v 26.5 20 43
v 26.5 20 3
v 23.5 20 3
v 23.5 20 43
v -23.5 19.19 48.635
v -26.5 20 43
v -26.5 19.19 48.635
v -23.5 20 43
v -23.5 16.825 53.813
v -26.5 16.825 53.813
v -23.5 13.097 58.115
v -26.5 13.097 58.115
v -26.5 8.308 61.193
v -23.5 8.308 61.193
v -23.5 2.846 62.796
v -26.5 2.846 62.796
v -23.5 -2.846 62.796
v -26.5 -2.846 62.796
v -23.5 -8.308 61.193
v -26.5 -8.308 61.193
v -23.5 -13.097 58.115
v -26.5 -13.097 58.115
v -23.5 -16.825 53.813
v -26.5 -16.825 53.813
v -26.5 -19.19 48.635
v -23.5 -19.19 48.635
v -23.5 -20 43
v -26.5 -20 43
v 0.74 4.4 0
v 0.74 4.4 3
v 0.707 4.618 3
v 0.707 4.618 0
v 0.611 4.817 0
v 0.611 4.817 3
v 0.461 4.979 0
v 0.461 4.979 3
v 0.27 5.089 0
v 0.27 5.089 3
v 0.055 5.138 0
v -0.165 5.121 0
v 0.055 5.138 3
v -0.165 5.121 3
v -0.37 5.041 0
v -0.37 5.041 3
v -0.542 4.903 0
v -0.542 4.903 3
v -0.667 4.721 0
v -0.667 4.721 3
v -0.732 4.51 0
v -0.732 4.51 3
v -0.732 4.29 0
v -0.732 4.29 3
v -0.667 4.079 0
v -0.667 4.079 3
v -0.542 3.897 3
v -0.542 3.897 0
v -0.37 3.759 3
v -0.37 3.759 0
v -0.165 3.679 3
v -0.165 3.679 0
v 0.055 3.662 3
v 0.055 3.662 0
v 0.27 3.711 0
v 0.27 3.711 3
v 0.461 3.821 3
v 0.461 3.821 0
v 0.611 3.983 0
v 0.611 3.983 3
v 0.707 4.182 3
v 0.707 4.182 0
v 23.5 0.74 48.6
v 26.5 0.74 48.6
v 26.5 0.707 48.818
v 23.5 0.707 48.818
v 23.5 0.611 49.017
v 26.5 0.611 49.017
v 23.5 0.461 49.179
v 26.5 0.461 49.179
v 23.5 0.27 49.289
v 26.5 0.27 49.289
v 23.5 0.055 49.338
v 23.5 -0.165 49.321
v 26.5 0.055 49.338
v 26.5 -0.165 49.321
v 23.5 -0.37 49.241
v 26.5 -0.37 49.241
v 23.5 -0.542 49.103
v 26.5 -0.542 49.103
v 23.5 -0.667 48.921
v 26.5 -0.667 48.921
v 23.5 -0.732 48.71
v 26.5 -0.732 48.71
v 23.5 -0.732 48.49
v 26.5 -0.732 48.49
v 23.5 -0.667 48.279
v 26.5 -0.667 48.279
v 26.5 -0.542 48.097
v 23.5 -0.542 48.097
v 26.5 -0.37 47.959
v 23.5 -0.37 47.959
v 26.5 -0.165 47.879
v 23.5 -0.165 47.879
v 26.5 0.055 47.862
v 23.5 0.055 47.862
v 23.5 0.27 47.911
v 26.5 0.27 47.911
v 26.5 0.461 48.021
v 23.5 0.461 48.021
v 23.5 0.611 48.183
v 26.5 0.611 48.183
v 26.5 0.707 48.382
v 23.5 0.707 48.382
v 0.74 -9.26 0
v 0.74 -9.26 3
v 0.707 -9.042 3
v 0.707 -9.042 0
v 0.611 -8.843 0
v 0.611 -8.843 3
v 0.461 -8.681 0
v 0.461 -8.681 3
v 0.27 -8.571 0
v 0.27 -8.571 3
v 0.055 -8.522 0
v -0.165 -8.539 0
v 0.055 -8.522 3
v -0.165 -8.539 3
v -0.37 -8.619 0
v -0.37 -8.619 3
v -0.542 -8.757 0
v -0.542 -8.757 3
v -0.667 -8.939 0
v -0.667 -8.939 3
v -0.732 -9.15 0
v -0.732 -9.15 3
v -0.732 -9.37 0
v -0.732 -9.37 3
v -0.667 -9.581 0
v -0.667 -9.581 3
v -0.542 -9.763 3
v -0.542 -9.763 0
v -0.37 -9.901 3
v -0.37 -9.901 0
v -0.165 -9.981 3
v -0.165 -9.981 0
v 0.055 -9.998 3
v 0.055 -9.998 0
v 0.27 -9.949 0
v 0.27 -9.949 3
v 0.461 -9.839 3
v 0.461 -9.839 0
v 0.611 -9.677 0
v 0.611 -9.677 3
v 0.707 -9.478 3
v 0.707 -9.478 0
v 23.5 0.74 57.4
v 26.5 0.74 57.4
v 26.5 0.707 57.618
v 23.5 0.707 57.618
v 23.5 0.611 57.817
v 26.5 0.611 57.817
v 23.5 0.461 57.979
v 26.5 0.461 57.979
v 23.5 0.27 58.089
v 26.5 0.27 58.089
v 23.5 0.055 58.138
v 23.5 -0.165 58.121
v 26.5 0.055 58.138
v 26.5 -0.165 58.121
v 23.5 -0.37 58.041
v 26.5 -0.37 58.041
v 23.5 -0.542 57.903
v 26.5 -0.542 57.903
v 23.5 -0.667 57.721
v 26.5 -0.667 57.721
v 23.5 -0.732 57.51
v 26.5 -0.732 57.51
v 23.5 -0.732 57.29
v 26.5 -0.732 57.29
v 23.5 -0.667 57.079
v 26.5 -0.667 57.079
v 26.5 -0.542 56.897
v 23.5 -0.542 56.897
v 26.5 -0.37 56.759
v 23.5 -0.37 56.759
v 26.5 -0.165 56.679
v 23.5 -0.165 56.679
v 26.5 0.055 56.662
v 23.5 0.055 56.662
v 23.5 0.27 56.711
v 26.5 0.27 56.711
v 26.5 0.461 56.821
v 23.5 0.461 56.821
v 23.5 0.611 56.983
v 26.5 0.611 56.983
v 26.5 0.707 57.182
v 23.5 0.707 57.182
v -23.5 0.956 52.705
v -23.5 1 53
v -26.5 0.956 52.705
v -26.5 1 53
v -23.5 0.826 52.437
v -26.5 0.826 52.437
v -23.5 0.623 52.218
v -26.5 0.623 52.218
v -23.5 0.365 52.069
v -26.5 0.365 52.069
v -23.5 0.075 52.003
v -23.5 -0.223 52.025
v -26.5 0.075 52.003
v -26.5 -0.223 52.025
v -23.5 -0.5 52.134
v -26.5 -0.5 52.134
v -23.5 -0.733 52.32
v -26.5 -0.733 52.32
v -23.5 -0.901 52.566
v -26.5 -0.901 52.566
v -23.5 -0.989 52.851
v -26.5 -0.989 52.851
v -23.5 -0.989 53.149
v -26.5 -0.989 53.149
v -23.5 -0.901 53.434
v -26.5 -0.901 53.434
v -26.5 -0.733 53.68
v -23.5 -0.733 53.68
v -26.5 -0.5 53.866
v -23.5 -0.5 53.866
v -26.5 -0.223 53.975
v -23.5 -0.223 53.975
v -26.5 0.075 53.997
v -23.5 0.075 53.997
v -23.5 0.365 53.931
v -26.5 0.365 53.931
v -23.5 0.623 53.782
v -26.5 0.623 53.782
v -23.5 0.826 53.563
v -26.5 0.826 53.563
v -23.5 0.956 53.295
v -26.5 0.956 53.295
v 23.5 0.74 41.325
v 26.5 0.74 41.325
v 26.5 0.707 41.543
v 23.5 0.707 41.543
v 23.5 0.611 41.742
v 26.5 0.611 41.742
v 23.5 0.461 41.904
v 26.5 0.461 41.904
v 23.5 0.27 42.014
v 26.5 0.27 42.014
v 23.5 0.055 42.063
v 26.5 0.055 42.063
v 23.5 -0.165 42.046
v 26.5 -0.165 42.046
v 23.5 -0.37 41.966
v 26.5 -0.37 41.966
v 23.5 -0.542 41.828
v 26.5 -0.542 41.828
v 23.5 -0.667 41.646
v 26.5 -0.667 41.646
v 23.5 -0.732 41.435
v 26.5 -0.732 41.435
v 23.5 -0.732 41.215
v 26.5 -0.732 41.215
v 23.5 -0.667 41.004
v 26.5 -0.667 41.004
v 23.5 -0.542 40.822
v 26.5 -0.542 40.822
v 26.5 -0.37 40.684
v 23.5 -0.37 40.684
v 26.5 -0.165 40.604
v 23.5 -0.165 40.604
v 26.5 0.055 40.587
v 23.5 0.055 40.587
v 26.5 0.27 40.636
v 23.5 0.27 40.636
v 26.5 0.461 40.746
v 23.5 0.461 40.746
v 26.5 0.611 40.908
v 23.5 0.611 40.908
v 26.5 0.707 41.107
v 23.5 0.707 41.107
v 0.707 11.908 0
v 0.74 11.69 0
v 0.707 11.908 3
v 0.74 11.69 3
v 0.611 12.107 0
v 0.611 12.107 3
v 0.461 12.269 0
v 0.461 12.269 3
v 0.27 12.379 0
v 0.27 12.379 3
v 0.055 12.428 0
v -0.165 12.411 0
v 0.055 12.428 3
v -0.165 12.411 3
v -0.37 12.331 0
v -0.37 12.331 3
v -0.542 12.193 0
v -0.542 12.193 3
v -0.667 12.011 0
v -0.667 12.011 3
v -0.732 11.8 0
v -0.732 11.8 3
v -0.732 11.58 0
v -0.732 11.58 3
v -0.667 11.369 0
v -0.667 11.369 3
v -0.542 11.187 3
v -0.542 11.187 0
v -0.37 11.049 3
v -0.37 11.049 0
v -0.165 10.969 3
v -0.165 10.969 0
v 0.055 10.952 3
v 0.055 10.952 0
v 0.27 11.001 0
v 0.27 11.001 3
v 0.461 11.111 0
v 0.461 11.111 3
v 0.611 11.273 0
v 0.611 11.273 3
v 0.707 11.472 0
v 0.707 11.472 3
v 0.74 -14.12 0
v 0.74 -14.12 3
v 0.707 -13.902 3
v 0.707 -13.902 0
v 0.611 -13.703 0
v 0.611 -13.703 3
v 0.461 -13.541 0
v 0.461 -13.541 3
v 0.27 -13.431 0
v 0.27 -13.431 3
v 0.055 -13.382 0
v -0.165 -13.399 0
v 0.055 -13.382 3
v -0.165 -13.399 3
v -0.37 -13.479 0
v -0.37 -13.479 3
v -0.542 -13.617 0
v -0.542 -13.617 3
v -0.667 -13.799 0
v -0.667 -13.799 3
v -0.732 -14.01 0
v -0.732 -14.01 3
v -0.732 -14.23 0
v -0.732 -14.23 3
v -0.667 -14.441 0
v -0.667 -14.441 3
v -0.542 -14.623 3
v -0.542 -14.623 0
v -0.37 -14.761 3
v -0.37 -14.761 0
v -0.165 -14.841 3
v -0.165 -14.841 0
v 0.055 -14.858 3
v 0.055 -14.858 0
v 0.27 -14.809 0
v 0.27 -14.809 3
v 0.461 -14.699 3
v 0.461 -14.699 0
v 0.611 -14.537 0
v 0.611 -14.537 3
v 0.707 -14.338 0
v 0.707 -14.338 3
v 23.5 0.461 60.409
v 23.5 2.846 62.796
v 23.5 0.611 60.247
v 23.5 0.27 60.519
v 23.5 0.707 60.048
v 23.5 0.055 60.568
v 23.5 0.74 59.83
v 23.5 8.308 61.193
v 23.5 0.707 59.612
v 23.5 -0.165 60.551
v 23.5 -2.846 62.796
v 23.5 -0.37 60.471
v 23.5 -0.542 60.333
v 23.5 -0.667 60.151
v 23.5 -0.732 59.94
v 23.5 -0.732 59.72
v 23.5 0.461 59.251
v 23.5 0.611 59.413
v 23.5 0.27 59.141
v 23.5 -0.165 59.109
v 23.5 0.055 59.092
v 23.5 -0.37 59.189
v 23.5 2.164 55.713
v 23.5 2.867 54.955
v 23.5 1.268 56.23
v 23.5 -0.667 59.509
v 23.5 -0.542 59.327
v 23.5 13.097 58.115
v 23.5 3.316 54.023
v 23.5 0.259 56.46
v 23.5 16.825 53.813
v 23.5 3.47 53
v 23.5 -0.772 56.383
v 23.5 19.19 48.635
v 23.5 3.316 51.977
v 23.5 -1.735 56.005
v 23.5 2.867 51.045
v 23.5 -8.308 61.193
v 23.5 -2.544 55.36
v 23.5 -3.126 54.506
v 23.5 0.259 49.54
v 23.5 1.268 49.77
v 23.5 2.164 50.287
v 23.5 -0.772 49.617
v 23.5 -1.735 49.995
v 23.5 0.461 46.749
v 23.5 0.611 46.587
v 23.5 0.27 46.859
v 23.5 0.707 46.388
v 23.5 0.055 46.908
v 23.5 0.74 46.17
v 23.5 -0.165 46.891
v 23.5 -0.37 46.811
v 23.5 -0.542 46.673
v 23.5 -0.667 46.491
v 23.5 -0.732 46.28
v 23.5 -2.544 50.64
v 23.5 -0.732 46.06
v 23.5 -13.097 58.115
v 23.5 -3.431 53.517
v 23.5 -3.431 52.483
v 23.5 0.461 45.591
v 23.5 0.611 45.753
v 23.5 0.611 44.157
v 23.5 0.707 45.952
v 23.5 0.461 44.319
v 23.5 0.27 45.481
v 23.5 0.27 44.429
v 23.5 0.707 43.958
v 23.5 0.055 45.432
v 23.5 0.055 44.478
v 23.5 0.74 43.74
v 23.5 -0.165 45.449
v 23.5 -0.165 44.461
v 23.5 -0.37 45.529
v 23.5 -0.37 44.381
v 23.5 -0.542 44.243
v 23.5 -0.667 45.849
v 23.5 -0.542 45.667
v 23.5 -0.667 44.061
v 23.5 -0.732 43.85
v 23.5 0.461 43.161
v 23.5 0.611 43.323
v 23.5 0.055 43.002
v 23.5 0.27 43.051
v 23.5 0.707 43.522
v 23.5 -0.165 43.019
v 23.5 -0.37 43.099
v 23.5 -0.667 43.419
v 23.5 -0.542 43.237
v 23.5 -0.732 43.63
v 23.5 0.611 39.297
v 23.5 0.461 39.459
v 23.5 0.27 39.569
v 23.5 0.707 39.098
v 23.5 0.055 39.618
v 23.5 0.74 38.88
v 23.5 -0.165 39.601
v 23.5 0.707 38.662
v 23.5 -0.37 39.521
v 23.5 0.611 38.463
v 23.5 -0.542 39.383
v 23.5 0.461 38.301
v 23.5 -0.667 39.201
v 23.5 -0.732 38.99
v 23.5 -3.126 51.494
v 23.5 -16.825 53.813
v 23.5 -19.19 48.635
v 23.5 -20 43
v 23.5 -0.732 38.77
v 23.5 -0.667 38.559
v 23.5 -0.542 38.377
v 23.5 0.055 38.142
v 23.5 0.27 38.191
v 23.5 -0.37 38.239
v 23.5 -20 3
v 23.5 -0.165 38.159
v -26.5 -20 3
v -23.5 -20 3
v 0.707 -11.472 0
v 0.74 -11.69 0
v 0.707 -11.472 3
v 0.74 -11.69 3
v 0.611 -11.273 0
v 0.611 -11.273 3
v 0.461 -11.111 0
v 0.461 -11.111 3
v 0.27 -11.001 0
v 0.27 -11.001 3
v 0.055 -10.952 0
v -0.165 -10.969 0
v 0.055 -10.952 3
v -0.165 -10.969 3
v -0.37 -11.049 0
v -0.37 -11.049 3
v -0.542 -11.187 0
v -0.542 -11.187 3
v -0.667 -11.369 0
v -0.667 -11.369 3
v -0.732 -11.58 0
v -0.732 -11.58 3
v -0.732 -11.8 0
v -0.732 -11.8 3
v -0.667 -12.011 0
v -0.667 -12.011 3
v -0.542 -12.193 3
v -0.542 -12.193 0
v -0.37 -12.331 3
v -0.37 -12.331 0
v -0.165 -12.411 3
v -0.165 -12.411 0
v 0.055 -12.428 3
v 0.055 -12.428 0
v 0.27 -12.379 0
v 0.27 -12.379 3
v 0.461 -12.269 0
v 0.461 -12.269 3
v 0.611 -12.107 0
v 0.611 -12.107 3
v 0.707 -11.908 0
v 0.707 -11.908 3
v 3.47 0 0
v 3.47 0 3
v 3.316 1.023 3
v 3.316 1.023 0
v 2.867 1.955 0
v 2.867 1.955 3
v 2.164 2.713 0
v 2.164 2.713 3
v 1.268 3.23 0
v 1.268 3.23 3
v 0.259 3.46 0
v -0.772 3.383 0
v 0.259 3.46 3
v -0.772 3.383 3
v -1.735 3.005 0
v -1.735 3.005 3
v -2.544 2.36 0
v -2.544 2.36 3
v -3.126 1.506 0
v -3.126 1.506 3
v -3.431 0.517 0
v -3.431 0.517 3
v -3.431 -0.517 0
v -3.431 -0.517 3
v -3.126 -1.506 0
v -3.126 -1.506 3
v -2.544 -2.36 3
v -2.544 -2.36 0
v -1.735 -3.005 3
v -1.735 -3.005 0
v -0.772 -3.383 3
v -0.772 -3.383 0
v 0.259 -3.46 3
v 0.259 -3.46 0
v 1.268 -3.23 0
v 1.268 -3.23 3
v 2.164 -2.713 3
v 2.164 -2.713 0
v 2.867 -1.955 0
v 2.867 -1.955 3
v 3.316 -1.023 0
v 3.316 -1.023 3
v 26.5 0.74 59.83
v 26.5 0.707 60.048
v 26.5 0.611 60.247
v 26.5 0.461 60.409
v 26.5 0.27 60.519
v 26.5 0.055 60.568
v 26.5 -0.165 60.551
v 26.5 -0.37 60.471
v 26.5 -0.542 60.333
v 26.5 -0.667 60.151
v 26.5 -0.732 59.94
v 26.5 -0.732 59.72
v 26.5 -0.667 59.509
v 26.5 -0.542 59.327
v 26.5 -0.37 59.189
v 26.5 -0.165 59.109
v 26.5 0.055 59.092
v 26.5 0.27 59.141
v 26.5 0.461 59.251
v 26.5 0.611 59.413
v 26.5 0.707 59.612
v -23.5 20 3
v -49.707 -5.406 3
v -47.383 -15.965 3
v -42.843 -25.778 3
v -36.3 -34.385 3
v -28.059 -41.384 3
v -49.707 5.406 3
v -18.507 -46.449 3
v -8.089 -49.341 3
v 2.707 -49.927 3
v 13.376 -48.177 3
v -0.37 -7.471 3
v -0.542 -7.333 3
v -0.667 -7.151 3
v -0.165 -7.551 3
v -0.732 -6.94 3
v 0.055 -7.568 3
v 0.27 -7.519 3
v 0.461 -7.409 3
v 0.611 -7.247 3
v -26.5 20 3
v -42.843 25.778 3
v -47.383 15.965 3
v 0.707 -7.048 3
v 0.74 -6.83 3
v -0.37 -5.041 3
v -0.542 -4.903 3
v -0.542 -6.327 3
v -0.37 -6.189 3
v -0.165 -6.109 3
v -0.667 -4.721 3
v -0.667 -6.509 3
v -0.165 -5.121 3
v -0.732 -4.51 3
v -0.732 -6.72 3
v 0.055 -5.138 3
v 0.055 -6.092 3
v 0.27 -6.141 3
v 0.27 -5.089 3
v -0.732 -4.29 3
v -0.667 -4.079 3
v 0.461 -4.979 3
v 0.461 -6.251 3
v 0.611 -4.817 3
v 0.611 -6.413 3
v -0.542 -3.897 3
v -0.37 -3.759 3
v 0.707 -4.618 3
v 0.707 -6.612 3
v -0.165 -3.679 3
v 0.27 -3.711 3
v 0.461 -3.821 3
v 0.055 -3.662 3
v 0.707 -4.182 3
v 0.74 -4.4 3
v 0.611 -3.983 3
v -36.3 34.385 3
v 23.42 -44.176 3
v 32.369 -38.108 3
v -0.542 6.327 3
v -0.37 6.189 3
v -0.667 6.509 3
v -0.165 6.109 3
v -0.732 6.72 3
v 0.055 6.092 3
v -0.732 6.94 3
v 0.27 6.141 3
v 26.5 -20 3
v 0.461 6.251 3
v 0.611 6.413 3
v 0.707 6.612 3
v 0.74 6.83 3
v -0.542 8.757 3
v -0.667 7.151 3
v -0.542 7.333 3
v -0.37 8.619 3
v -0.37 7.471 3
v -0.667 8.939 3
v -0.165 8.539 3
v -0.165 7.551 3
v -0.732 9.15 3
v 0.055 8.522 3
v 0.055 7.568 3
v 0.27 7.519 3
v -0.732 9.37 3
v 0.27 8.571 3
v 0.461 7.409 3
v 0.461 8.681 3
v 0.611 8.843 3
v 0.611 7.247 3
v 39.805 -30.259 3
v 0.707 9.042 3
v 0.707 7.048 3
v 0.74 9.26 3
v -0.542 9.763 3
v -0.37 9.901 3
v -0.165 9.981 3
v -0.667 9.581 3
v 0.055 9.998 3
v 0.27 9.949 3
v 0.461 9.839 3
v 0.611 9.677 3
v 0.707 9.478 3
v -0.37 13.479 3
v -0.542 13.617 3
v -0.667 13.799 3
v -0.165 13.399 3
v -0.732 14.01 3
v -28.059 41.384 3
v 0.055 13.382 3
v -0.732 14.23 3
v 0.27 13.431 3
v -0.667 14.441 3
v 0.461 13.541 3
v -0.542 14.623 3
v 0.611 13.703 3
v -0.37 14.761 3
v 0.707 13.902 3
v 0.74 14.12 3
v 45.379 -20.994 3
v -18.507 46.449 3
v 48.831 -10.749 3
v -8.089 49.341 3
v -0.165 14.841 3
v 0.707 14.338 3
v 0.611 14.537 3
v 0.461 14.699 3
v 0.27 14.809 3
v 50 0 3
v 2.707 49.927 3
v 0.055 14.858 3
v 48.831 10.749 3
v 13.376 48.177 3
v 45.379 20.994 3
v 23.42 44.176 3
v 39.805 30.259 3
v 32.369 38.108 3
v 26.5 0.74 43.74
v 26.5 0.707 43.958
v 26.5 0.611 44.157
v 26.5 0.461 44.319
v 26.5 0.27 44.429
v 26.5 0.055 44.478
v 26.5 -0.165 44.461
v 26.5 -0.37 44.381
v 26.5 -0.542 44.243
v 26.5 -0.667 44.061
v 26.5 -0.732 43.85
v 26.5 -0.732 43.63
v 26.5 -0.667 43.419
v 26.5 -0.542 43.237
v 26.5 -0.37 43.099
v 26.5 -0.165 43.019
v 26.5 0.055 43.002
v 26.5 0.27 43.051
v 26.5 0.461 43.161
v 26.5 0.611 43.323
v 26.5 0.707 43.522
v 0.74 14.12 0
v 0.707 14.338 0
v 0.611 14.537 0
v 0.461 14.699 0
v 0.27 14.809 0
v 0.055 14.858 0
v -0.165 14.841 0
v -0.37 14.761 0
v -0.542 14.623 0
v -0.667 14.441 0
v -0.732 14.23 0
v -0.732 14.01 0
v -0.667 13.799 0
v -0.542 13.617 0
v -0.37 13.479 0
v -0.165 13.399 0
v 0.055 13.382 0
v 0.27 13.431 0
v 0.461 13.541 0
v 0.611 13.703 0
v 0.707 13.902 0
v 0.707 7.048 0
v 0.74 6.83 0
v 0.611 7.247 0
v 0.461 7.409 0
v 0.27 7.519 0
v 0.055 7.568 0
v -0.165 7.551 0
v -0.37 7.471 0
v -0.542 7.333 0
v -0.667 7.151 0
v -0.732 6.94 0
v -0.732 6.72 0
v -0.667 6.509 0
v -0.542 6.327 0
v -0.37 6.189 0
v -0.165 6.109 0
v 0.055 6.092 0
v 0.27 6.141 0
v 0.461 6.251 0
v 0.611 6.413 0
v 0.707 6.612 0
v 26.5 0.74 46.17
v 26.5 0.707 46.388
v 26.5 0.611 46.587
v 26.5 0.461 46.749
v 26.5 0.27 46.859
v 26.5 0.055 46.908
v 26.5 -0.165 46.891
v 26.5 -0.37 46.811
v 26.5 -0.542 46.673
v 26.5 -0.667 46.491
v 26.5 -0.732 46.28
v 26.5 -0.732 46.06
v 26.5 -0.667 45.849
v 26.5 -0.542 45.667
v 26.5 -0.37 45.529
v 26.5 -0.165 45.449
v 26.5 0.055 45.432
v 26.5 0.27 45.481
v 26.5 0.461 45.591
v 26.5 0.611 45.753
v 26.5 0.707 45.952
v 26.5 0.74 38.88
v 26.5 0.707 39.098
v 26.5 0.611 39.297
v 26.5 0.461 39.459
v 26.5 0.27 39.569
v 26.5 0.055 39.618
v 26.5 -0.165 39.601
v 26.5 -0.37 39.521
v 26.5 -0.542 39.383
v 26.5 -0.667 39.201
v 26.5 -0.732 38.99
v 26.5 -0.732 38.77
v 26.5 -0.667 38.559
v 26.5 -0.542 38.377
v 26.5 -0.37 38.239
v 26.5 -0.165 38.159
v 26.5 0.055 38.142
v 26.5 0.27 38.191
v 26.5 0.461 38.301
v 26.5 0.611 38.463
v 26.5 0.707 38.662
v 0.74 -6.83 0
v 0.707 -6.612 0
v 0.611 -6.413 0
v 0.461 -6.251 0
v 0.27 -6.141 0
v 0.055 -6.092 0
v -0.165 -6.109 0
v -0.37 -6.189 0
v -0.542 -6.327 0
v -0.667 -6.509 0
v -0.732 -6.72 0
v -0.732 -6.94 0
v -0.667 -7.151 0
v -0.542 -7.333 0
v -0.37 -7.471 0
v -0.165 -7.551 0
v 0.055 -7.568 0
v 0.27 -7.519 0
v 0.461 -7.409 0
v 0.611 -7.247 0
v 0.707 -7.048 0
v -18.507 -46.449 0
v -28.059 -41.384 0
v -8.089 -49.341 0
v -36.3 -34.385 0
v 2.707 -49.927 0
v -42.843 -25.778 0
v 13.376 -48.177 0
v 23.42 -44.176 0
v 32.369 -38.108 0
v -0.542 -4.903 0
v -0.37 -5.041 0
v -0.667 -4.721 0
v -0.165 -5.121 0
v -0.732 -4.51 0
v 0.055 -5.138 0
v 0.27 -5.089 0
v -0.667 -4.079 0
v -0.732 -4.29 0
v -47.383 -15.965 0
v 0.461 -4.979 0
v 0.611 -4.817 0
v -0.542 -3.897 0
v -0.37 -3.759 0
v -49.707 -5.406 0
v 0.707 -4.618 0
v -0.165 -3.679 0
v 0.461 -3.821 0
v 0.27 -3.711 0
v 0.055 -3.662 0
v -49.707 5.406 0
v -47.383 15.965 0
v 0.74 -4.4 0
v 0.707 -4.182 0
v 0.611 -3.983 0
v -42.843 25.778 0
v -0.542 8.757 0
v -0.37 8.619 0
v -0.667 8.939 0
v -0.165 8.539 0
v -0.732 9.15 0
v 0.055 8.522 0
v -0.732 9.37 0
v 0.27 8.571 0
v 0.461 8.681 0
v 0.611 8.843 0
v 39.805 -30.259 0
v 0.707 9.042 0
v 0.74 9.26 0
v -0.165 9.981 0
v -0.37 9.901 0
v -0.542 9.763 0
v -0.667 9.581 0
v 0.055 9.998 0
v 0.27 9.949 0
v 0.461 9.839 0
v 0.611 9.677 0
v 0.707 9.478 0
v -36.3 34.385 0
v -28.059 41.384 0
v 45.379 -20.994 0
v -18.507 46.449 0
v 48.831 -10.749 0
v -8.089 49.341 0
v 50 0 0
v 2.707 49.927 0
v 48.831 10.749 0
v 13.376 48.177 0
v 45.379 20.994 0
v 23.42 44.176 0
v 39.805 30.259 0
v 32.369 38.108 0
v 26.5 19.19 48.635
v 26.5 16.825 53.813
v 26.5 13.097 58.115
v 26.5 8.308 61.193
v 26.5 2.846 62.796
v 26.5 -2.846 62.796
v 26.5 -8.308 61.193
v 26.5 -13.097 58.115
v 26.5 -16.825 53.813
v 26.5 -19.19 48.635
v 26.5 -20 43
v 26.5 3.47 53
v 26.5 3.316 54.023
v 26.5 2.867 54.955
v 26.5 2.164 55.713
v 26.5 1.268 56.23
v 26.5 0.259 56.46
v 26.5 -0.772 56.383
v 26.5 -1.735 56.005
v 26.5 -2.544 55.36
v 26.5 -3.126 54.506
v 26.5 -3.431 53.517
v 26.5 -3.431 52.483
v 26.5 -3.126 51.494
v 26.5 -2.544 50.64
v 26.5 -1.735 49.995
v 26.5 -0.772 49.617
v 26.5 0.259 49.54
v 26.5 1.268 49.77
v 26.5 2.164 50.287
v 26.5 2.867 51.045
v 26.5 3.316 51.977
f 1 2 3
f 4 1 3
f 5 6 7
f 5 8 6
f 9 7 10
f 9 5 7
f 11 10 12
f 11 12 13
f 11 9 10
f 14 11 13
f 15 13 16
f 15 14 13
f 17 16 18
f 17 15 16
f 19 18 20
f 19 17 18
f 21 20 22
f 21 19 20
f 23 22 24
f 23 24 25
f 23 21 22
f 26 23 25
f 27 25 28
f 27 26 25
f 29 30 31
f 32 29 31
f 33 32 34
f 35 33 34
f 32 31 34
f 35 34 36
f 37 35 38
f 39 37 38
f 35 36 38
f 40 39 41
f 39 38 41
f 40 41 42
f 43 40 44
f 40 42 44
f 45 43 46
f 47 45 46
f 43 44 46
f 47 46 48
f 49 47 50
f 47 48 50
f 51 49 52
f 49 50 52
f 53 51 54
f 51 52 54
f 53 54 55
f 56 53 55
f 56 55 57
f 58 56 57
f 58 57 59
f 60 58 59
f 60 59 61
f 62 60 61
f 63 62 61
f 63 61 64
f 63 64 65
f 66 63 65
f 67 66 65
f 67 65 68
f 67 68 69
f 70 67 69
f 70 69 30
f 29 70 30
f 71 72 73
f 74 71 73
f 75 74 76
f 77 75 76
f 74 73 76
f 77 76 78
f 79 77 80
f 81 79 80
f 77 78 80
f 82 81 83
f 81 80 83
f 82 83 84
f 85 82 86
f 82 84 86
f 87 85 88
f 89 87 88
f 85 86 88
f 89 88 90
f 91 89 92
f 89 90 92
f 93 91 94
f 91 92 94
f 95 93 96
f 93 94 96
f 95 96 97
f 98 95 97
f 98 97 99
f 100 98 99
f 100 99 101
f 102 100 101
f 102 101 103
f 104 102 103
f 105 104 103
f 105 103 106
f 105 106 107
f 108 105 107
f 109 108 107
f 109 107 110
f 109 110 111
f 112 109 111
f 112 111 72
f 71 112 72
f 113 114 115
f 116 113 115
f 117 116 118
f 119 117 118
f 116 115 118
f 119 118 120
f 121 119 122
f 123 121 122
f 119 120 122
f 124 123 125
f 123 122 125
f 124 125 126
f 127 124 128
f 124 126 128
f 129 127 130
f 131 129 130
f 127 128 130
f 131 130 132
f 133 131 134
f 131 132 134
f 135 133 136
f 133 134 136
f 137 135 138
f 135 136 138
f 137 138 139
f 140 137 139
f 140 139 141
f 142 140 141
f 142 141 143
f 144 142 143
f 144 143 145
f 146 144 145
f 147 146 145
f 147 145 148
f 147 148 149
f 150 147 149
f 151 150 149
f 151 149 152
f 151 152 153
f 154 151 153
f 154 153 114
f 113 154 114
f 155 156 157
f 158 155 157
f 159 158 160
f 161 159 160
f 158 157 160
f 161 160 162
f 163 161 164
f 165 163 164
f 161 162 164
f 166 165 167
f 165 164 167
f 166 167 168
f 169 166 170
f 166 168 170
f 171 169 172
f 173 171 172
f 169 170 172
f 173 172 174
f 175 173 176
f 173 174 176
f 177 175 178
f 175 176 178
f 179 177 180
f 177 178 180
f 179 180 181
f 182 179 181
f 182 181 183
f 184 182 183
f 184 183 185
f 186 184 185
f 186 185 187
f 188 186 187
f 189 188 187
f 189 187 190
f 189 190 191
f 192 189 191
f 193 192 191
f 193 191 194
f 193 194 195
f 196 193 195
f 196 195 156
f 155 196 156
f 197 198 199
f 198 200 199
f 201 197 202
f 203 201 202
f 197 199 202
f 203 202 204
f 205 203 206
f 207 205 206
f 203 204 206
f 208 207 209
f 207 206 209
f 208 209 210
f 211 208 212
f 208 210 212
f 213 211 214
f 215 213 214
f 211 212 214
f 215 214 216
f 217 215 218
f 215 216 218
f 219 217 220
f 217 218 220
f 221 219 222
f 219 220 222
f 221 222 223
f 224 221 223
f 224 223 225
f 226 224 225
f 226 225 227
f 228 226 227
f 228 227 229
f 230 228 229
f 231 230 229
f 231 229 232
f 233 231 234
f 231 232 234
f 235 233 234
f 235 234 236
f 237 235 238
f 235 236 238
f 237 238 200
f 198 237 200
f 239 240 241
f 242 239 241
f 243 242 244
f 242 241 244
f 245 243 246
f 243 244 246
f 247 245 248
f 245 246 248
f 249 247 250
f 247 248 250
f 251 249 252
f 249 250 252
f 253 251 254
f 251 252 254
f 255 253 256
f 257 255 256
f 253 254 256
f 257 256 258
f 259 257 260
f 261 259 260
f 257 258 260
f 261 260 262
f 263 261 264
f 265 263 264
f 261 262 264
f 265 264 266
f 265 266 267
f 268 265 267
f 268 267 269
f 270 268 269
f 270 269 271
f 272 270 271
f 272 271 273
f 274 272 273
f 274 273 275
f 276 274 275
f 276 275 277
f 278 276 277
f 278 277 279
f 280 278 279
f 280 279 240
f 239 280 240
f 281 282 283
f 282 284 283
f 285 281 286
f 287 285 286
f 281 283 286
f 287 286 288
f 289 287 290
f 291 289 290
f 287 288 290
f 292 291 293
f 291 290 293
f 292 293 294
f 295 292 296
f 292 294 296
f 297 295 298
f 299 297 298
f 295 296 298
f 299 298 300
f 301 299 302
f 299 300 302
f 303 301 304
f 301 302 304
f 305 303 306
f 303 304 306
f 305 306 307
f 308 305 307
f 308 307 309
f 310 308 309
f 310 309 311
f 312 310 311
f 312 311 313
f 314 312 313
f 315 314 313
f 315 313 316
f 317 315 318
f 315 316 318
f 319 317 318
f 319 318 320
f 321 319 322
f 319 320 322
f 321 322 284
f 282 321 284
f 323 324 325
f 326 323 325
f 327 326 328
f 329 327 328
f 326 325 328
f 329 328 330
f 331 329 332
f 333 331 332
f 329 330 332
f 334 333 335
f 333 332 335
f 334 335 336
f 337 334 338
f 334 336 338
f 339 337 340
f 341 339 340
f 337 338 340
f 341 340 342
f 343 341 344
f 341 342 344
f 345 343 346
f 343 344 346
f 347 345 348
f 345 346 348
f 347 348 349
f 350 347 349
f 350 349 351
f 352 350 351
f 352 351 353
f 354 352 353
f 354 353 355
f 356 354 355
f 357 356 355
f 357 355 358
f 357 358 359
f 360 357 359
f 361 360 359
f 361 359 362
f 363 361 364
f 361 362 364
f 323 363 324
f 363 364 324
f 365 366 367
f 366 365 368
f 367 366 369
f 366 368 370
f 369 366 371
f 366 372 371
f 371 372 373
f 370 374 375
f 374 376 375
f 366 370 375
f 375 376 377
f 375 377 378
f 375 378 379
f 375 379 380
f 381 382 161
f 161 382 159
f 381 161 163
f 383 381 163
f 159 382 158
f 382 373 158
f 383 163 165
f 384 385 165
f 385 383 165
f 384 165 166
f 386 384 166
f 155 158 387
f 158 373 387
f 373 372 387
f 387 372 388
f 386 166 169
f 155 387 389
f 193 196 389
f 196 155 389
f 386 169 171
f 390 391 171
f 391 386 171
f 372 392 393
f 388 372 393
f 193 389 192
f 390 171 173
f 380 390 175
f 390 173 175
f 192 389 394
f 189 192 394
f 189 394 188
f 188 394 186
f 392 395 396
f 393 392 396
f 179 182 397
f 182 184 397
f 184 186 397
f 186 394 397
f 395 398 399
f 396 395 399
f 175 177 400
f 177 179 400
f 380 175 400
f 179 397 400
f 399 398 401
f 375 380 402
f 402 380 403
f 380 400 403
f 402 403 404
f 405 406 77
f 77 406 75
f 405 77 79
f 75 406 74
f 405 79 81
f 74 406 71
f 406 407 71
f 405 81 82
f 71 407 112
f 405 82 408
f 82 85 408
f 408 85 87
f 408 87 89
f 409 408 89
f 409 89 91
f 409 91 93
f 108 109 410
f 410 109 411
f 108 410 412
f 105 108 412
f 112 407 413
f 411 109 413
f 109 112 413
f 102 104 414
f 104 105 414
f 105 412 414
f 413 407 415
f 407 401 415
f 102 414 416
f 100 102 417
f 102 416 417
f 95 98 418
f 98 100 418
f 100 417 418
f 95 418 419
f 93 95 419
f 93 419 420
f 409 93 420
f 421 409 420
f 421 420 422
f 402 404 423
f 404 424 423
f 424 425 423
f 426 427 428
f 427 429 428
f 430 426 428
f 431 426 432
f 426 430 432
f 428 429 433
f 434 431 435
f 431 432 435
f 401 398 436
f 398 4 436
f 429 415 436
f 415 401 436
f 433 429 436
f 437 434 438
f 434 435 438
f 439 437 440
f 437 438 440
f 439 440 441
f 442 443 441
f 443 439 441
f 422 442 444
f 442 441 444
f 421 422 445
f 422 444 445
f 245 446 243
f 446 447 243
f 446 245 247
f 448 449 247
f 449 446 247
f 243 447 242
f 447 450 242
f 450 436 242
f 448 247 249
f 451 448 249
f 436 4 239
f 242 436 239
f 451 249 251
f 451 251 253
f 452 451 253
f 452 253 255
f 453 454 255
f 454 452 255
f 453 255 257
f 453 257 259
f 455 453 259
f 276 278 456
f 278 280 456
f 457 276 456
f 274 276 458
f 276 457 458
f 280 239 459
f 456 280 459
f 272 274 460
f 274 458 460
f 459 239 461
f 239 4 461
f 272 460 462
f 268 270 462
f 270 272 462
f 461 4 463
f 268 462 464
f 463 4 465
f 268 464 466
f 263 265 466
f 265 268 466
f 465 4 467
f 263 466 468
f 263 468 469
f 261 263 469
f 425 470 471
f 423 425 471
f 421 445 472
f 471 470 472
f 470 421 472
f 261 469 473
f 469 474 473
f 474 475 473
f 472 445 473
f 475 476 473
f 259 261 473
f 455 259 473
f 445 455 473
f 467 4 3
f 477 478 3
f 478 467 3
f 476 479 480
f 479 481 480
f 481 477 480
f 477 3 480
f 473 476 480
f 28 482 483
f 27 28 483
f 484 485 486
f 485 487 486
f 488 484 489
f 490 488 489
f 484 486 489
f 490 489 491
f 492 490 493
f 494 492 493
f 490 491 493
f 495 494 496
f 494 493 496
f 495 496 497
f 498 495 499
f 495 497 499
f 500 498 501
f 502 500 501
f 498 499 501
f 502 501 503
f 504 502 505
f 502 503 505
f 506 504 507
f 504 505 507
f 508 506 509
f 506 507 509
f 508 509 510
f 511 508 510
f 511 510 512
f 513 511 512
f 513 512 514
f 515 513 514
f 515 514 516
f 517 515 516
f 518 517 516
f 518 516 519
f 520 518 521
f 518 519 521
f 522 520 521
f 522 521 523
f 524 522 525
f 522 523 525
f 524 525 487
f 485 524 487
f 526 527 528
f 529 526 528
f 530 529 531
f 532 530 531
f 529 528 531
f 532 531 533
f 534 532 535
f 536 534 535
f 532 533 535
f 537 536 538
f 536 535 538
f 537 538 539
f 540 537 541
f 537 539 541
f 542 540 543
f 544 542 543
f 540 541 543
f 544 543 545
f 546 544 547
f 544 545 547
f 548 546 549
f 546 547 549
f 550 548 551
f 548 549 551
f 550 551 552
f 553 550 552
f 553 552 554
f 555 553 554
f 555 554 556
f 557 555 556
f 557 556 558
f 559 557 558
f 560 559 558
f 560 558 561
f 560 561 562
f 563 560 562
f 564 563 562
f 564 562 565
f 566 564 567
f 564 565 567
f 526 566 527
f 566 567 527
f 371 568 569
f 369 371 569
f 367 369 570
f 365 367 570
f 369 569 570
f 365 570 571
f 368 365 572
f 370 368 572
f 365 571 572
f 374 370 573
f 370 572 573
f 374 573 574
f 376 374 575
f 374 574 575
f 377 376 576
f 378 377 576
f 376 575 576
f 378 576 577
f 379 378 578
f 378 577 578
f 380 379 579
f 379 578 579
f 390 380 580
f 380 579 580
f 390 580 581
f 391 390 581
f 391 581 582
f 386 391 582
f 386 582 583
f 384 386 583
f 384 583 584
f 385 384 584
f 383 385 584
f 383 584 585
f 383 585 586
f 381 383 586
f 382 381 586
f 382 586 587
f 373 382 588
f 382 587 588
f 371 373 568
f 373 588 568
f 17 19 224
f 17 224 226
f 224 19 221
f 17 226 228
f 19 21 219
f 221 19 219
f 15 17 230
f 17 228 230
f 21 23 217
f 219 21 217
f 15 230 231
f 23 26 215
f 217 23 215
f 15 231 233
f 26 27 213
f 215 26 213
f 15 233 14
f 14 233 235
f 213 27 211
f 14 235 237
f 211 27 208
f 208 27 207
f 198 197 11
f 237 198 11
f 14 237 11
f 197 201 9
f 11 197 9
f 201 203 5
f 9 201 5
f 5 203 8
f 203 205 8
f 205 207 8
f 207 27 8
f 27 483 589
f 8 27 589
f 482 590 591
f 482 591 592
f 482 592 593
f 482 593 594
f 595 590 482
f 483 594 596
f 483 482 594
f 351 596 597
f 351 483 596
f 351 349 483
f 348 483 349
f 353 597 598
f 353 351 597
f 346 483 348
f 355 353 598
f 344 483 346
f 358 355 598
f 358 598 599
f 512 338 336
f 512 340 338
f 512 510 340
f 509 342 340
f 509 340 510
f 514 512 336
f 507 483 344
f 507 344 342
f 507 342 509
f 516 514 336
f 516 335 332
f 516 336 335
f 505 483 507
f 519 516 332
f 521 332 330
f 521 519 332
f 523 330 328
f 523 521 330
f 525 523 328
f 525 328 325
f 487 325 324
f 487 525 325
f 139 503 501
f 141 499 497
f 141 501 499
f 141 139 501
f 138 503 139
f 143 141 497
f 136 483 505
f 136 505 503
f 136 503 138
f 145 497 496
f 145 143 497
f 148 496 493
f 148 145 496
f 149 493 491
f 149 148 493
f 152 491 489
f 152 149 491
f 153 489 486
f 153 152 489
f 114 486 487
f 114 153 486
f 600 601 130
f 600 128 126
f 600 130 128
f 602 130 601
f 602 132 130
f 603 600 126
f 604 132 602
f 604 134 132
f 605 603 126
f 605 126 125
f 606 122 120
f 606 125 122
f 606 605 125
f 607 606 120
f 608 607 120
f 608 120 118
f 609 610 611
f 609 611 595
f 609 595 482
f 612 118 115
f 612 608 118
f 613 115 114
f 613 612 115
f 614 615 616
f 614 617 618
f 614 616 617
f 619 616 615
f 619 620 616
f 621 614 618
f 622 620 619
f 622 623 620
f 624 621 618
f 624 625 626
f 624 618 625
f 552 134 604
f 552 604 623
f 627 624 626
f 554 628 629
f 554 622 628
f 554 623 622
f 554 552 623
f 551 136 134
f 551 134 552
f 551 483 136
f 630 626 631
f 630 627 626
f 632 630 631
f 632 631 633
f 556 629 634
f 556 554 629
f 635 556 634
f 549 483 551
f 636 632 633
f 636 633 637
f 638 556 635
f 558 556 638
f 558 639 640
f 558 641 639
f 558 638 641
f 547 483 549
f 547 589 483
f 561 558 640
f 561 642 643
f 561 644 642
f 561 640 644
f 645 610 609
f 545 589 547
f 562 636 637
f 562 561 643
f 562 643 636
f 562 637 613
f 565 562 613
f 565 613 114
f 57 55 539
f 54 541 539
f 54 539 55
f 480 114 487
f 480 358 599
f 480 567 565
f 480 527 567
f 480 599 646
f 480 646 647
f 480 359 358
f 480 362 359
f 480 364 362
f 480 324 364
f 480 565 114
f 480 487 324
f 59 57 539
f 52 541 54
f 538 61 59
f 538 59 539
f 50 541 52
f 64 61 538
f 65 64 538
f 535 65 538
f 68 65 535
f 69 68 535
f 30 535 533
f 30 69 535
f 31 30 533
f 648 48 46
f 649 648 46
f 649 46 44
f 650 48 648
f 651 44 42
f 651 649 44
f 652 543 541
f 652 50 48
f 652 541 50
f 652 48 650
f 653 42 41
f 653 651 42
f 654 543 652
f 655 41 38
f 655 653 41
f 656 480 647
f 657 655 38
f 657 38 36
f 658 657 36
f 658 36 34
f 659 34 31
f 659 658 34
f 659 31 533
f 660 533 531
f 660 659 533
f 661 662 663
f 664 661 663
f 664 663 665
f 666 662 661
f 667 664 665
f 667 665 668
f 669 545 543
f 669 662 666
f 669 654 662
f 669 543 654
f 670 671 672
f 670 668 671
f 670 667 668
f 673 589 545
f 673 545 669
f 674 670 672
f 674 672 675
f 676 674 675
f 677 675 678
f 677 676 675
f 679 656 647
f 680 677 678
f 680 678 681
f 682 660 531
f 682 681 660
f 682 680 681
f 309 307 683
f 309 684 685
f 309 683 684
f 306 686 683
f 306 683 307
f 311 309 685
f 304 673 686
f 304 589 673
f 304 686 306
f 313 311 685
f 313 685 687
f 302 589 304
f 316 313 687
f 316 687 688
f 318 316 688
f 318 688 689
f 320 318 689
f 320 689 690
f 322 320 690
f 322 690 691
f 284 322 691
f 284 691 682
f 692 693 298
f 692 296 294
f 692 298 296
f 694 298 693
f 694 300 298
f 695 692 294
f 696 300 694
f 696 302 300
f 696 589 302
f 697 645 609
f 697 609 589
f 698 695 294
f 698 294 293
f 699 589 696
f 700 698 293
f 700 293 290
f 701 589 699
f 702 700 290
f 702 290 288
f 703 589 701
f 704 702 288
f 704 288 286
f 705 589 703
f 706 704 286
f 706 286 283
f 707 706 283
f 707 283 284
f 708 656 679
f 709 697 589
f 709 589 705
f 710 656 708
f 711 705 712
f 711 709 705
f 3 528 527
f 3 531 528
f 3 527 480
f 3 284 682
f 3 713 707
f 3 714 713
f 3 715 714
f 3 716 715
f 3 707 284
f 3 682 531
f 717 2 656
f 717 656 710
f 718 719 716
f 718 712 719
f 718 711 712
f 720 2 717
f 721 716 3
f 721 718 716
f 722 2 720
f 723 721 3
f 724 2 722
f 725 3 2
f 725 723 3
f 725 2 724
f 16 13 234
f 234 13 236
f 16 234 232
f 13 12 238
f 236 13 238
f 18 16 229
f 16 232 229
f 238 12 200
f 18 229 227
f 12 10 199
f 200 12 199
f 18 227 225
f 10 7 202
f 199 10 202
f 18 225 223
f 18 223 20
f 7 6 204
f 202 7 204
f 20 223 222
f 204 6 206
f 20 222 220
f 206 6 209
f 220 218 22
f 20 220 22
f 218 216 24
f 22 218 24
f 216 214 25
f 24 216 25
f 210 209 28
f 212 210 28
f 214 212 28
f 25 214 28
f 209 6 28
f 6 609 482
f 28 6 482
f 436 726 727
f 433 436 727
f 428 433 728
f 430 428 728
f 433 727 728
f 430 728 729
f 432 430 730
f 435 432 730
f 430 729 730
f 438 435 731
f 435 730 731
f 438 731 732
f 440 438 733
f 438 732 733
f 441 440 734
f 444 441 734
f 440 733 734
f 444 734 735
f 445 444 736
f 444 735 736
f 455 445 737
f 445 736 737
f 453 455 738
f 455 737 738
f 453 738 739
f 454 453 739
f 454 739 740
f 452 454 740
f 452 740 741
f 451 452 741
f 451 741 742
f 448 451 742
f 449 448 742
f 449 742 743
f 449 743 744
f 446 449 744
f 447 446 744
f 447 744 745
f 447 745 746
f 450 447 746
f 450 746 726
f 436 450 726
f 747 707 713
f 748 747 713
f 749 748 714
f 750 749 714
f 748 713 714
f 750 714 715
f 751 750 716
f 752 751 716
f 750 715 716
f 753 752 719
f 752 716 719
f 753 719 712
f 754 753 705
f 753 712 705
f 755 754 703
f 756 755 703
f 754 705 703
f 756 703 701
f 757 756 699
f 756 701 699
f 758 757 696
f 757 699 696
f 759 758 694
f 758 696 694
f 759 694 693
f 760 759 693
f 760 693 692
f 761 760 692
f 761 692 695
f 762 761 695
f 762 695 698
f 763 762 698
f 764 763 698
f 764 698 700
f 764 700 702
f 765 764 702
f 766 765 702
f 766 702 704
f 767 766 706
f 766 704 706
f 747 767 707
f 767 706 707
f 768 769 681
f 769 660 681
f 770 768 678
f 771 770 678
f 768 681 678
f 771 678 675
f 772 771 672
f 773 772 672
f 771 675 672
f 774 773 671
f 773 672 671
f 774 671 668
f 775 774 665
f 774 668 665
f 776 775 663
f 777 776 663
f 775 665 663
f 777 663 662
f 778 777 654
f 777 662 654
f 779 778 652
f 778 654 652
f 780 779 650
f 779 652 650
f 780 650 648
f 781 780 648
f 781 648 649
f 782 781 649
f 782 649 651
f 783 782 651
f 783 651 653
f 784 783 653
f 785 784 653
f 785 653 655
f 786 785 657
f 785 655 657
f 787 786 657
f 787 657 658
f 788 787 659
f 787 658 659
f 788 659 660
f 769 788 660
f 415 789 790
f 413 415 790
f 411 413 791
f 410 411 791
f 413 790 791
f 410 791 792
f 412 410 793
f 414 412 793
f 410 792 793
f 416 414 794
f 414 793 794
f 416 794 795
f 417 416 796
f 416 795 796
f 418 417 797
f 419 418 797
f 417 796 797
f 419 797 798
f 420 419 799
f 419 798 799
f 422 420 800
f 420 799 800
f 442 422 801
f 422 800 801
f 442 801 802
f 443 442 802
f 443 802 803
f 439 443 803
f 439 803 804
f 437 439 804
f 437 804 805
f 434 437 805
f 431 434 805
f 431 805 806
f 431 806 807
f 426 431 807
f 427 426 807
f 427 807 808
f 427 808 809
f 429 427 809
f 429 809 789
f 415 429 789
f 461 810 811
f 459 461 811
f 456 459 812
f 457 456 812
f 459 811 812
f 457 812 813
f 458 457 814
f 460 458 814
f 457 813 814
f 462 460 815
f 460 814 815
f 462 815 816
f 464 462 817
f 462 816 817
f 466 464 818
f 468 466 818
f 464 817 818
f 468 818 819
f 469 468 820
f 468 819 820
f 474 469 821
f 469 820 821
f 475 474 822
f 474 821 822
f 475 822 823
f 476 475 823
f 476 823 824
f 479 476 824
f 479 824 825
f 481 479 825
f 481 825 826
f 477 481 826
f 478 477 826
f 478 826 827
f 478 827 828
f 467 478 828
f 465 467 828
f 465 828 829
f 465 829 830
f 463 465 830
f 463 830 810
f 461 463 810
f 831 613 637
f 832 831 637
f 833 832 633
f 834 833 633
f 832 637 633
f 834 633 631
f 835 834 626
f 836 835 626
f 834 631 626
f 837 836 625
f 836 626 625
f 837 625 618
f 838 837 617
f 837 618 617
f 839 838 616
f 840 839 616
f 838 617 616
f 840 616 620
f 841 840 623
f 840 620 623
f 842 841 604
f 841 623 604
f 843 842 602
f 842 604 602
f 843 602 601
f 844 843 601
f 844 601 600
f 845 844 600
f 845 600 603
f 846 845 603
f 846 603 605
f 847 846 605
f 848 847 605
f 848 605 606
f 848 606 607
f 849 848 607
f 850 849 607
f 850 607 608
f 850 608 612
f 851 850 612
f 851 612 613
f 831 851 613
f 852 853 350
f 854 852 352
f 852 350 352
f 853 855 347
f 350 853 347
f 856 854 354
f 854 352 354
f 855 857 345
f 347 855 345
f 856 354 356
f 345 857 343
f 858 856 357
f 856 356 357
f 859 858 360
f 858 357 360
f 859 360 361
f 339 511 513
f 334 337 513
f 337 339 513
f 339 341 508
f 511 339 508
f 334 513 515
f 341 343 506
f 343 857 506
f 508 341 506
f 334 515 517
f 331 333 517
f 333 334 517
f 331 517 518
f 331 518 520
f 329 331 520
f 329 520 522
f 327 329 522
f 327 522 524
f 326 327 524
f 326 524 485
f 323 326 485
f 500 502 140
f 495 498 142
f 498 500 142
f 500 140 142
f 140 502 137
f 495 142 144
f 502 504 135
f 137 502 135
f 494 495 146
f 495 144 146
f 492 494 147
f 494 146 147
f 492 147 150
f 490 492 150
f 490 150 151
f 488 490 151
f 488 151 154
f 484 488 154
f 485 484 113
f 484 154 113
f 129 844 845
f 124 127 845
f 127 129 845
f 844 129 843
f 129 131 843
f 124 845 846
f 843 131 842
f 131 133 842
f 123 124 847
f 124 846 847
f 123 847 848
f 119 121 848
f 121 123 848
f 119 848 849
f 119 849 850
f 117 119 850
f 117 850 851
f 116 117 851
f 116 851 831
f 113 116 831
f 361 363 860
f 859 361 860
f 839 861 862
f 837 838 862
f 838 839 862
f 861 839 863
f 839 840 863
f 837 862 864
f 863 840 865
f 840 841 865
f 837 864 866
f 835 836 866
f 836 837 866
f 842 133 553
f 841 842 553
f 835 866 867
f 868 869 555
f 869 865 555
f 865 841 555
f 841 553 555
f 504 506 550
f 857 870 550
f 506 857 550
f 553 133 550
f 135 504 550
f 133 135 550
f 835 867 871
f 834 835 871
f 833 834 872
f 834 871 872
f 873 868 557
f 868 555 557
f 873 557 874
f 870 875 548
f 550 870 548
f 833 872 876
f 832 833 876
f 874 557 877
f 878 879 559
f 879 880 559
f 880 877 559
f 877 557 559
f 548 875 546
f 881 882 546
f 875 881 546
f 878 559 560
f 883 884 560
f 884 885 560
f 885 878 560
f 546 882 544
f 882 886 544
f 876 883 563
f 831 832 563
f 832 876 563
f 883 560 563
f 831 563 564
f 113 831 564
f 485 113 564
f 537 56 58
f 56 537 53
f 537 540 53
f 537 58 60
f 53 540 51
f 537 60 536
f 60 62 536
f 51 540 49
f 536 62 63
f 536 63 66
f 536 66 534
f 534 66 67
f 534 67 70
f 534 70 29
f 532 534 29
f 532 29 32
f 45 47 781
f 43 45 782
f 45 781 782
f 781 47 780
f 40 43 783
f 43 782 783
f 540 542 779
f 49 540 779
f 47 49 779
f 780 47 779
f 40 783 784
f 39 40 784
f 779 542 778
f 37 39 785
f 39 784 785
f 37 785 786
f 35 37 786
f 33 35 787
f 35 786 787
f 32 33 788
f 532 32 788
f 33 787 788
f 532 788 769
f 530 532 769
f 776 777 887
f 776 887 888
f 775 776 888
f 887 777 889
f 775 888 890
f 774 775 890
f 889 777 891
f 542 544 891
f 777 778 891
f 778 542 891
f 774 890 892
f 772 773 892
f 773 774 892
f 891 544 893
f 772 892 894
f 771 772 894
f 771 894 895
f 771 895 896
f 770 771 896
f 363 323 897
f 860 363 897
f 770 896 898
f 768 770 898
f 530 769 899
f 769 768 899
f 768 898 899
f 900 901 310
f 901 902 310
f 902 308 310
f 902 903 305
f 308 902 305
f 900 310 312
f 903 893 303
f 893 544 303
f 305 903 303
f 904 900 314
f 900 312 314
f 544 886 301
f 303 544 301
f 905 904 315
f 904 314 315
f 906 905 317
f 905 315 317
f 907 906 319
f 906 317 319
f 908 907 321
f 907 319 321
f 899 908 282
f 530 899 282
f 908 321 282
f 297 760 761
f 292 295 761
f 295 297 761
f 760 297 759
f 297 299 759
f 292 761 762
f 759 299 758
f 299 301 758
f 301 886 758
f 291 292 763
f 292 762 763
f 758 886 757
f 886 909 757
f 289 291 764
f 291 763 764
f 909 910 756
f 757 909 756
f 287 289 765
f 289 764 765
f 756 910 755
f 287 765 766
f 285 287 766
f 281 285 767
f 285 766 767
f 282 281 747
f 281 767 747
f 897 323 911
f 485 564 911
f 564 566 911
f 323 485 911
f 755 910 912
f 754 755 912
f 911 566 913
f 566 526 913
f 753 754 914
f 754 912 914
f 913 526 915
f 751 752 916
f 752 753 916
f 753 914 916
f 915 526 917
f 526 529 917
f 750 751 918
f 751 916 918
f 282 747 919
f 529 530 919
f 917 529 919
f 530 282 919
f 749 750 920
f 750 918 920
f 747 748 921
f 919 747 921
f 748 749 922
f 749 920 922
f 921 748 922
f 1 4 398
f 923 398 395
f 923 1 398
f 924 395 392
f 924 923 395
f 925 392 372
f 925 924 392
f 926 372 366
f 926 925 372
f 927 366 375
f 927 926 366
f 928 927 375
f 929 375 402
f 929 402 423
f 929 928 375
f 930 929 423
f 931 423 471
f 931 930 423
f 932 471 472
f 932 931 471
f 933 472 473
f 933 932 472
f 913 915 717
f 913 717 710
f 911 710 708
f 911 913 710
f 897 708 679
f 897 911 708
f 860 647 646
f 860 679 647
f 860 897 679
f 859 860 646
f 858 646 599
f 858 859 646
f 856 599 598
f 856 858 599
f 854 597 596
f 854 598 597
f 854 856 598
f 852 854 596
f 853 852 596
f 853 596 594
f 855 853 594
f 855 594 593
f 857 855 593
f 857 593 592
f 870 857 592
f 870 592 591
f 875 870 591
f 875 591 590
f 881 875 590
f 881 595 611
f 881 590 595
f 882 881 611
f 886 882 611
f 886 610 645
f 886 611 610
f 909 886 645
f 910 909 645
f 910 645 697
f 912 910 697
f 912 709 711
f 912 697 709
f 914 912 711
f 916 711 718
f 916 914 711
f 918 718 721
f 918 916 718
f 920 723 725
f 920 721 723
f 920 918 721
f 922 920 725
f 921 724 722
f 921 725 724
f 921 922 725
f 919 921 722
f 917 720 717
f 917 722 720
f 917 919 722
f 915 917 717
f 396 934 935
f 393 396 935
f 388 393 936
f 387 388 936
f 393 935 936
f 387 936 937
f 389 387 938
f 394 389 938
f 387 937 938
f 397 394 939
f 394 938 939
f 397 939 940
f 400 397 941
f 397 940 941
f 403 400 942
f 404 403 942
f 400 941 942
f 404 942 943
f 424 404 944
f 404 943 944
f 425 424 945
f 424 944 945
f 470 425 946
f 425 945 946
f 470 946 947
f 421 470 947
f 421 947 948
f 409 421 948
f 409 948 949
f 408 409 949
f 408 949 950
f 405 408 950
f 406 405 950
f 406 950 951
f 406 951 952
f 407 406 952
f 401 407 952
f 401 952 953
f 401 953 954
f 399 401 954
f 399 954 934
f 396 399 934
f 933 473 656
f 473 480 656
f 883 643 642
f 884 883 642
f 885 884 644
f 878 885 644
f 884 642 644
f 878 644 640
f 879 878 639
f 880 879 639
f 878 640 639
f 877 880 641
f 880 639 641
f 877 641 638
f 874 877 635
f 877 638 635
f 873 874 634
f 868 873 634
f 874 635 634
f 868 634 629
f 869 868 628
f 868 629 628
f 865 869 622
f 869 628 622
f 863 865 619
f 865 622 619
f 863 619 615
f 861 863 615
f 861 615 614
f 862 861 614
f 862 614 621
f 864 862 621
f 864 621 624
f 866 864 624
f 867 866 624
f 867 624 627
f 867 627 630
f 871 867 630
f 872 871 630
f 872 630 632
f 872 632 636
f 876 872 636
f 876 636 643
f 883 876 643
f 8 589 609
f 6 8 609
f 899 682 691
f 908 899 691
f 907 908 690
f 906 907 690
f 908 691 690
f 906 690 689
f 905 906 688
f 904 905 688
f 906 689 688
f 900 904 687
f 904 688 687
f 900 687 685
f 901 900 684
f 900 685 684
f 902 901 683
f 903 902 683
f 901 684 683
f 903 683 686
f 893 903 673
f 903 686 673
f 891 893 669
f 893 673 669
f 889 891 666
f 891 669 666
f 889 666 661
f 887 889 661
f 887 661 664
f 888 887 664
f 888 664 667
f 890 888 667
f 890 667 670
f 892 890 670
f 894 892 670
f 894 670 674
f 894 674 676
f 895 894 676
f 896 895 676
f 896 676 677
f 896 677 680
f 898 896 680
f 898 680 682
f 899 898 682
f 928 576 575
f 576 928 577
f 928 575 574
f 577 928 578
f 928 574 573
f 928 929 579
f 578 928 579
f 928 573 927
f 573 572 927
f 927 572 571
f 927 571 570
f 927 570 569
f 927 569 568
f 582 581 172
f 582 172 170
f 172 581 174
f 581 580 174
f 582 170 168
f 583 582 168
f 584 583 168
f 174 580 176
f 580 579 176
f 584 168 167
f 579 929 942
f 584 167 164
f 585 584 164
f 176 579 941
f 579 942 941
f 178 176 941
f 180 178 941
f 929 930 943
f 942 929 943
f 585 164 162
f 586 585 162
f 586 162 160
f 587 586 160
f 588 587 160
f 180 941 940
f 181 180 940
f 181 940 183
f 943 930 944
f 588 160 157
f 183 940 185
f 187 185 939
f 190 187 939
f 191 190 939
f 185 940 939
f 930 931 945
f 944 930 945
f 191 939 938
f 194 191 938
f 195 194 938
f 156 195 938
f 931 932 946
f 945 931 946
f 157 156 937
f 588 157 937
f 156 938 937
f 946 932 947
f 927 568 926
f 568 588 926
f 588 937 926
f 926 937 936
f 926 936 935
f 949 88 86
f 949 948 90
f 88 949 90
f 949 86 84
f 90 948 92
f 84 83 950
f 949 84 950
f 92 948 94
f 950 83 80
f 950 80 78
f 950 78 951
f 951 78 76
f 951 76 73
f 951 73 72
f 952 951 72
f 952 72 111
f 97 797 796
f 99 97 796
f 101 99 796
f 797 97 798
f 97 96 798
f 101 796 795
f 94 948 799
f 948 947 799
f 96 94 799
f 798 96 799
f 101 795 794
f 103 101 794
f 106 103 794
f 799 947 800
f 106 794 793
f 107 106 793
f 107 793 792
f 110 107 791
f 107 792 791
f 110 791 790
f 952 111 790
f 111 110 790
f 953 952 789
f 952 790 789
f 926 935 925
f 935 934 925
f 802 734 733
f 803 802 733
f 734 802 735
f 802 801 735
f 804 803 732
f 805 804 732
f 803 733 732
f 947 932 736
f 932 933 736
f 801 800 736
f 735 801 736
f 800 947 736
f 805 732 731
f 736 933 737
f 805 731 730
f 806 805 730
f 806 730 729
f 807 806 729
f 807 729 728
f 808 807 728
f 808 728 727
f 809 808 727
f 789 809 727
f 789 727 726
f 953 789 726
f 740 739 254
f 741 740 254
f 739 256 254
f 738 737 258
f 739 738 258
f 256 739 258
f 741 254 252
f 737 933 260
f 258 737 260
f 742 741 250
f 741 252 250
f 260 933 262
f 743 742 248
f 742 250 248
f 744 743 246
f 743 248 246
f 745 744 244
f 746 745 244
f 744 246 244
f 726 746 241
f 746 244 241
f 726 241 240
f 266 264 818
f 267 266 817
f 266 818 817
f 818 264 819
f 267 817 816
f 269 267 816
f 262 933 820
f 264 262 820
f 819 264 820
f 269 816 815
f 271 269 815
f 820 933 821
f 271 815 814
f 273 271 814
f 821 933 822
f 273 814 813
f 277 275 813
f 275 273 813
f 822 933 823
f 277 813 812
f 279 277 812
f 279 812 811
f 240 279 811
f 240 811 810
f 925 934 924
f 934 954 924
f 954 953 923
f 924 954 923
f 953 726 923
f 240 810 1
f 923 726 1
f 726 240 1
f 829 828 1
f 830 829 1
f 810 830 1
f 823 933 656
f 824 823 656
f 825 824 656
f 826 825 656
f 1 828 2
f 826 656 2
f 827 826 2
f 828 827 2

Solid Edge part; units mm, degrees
sketch "Sketch1" plane through (0, 0, 0) normal (0, 0, 1) x (1, 0, 0)
  circle A0 centre (0, 0) radius 50
extrude "Protrusion1" add sketch "Sketch1" along normal blind 3
sketch "Sketch2" plane through (0, 0, 3) normal (0, 0, 1) x (1, 0, 0)
  circle A0 centre (0, 0) radius 3.47
  circle A1 centre (0, 4.4) radius 0.74
  circle A2 centre (0, 6.83) radius 0.74
  circle A3 centre (0, 9.26) radius 0.74
  circle A4 centre (0, 11.69) radius 0.74
  circle A5 centre (0, 14.12) radius 0.74
  circle A6 centre (0, -4.4) radius 0.74
  circle A7 centre (0, -6.83) radius 0.74
  circle A8 centre (0, -9.26) radius 0.74
  circle A9 centre (0, -11.69) radius 0.74
  circle A10 centre (0, -14.12) radius 0.74
extrude "ExtrudedCutout_1" cut sketch "Sketch2" against normal blind 36.9192
sketch "Sketch3" plane through (0, 0, 3) normal (0, 0, 1) x (1, 0, 0)
  line L0 (-23.5, 20) -> (-26.5, 20)
  line L1 (-26.5, 20) -> (-26.5, -20)
  line L2 (-26.5, -20) -> (-23.5, -20)
  line L3 (-23.5, -20) -> (-23.5, 20)
  line L4 (26.5, 20) -> (23.5, 20)
  line L5 (23.5, 20) -> (23.5, -20)
  line L6 (23.5, -20) -> (26.5, -20)
  line L7 (26.5, -20) -> (26.5, 20)
extrude "ExtrudedProtrusion_2" add sketch "Sketch3" along normal blind 70
sketch "Sketch4" plane through (26.5, 0, 38) normal (1, 0, 0) x (0, 1, 0)
  arc A0 (-20, 5) -> (20, 5) centre (0, 5) cw
  line L0 (21.1932, 5) -> (20, 5)
  line L1 (21.1932, 36.3058) -> (21.1932, 5)
  line L2 (-22.4171, 36.3058) -> (21.1932, 36.3058)
  line L3 (-22.4171, 5) -> (-22.4171, 36.3058)
  line L4 (-20, 5) -> (-22.4171, 5)
extrude "ExtrudedCutout_2" cut sketch "Sketch4" against normal blind 67.3152
sketch "Sketch5" plane through (26.5, 0, 33) normal (1, 0, 0) x (0, 1, 0)
  circle A0 centre (0, 20) radius 3.47
  circle A1 centre (0, 24.4) radius 0.725
  circle A2 centre (0, 26.83) radius 0.725
  circle A3 centre (0, 15.6) radius 0.725
  circle A4 centre (0, 13.17) radius 0.725
  circle A5 centre (0, 10.74) radius 0.725
  circle A6 centre (0, 8.31) radius 0.725
  circle A7 centre (0, 5.88) radius 0.725
extrude "ExtrudedCutout_3" cut sketch "Sketch5" against normal blind 3
sketch "Sketch6" plane through (26.5, 0, 33) normal (1, 0, 0) x (0, 1, 0)
  circle A0 centre (0, 24.4) radius 0.74
  circle A1 centre (0, 26.83) radius 0.74
  circle A2 centre (0, 5.88) radius 0.74
  circle A3 centre (0, 8.325) radius 0.74
  circle A4 centre (0, 10.74) radius 0.74
  circle A5 centre (0, 13.17) radius 0.74
  circle A6 centre (0, 15.6) radius 0.74
extrude "Cutout1" cut sketch "Sketch6" against normal blind 3
sketch "Sketch7" plane through (-26.5, 0, 33) normal (-1, 0, 0) x (0, 1, 0)
  circle A0 centre (0, -20) radius 1
extrude "Cutout2" cut sketch "Sketch7" against normal blind 4.0137
